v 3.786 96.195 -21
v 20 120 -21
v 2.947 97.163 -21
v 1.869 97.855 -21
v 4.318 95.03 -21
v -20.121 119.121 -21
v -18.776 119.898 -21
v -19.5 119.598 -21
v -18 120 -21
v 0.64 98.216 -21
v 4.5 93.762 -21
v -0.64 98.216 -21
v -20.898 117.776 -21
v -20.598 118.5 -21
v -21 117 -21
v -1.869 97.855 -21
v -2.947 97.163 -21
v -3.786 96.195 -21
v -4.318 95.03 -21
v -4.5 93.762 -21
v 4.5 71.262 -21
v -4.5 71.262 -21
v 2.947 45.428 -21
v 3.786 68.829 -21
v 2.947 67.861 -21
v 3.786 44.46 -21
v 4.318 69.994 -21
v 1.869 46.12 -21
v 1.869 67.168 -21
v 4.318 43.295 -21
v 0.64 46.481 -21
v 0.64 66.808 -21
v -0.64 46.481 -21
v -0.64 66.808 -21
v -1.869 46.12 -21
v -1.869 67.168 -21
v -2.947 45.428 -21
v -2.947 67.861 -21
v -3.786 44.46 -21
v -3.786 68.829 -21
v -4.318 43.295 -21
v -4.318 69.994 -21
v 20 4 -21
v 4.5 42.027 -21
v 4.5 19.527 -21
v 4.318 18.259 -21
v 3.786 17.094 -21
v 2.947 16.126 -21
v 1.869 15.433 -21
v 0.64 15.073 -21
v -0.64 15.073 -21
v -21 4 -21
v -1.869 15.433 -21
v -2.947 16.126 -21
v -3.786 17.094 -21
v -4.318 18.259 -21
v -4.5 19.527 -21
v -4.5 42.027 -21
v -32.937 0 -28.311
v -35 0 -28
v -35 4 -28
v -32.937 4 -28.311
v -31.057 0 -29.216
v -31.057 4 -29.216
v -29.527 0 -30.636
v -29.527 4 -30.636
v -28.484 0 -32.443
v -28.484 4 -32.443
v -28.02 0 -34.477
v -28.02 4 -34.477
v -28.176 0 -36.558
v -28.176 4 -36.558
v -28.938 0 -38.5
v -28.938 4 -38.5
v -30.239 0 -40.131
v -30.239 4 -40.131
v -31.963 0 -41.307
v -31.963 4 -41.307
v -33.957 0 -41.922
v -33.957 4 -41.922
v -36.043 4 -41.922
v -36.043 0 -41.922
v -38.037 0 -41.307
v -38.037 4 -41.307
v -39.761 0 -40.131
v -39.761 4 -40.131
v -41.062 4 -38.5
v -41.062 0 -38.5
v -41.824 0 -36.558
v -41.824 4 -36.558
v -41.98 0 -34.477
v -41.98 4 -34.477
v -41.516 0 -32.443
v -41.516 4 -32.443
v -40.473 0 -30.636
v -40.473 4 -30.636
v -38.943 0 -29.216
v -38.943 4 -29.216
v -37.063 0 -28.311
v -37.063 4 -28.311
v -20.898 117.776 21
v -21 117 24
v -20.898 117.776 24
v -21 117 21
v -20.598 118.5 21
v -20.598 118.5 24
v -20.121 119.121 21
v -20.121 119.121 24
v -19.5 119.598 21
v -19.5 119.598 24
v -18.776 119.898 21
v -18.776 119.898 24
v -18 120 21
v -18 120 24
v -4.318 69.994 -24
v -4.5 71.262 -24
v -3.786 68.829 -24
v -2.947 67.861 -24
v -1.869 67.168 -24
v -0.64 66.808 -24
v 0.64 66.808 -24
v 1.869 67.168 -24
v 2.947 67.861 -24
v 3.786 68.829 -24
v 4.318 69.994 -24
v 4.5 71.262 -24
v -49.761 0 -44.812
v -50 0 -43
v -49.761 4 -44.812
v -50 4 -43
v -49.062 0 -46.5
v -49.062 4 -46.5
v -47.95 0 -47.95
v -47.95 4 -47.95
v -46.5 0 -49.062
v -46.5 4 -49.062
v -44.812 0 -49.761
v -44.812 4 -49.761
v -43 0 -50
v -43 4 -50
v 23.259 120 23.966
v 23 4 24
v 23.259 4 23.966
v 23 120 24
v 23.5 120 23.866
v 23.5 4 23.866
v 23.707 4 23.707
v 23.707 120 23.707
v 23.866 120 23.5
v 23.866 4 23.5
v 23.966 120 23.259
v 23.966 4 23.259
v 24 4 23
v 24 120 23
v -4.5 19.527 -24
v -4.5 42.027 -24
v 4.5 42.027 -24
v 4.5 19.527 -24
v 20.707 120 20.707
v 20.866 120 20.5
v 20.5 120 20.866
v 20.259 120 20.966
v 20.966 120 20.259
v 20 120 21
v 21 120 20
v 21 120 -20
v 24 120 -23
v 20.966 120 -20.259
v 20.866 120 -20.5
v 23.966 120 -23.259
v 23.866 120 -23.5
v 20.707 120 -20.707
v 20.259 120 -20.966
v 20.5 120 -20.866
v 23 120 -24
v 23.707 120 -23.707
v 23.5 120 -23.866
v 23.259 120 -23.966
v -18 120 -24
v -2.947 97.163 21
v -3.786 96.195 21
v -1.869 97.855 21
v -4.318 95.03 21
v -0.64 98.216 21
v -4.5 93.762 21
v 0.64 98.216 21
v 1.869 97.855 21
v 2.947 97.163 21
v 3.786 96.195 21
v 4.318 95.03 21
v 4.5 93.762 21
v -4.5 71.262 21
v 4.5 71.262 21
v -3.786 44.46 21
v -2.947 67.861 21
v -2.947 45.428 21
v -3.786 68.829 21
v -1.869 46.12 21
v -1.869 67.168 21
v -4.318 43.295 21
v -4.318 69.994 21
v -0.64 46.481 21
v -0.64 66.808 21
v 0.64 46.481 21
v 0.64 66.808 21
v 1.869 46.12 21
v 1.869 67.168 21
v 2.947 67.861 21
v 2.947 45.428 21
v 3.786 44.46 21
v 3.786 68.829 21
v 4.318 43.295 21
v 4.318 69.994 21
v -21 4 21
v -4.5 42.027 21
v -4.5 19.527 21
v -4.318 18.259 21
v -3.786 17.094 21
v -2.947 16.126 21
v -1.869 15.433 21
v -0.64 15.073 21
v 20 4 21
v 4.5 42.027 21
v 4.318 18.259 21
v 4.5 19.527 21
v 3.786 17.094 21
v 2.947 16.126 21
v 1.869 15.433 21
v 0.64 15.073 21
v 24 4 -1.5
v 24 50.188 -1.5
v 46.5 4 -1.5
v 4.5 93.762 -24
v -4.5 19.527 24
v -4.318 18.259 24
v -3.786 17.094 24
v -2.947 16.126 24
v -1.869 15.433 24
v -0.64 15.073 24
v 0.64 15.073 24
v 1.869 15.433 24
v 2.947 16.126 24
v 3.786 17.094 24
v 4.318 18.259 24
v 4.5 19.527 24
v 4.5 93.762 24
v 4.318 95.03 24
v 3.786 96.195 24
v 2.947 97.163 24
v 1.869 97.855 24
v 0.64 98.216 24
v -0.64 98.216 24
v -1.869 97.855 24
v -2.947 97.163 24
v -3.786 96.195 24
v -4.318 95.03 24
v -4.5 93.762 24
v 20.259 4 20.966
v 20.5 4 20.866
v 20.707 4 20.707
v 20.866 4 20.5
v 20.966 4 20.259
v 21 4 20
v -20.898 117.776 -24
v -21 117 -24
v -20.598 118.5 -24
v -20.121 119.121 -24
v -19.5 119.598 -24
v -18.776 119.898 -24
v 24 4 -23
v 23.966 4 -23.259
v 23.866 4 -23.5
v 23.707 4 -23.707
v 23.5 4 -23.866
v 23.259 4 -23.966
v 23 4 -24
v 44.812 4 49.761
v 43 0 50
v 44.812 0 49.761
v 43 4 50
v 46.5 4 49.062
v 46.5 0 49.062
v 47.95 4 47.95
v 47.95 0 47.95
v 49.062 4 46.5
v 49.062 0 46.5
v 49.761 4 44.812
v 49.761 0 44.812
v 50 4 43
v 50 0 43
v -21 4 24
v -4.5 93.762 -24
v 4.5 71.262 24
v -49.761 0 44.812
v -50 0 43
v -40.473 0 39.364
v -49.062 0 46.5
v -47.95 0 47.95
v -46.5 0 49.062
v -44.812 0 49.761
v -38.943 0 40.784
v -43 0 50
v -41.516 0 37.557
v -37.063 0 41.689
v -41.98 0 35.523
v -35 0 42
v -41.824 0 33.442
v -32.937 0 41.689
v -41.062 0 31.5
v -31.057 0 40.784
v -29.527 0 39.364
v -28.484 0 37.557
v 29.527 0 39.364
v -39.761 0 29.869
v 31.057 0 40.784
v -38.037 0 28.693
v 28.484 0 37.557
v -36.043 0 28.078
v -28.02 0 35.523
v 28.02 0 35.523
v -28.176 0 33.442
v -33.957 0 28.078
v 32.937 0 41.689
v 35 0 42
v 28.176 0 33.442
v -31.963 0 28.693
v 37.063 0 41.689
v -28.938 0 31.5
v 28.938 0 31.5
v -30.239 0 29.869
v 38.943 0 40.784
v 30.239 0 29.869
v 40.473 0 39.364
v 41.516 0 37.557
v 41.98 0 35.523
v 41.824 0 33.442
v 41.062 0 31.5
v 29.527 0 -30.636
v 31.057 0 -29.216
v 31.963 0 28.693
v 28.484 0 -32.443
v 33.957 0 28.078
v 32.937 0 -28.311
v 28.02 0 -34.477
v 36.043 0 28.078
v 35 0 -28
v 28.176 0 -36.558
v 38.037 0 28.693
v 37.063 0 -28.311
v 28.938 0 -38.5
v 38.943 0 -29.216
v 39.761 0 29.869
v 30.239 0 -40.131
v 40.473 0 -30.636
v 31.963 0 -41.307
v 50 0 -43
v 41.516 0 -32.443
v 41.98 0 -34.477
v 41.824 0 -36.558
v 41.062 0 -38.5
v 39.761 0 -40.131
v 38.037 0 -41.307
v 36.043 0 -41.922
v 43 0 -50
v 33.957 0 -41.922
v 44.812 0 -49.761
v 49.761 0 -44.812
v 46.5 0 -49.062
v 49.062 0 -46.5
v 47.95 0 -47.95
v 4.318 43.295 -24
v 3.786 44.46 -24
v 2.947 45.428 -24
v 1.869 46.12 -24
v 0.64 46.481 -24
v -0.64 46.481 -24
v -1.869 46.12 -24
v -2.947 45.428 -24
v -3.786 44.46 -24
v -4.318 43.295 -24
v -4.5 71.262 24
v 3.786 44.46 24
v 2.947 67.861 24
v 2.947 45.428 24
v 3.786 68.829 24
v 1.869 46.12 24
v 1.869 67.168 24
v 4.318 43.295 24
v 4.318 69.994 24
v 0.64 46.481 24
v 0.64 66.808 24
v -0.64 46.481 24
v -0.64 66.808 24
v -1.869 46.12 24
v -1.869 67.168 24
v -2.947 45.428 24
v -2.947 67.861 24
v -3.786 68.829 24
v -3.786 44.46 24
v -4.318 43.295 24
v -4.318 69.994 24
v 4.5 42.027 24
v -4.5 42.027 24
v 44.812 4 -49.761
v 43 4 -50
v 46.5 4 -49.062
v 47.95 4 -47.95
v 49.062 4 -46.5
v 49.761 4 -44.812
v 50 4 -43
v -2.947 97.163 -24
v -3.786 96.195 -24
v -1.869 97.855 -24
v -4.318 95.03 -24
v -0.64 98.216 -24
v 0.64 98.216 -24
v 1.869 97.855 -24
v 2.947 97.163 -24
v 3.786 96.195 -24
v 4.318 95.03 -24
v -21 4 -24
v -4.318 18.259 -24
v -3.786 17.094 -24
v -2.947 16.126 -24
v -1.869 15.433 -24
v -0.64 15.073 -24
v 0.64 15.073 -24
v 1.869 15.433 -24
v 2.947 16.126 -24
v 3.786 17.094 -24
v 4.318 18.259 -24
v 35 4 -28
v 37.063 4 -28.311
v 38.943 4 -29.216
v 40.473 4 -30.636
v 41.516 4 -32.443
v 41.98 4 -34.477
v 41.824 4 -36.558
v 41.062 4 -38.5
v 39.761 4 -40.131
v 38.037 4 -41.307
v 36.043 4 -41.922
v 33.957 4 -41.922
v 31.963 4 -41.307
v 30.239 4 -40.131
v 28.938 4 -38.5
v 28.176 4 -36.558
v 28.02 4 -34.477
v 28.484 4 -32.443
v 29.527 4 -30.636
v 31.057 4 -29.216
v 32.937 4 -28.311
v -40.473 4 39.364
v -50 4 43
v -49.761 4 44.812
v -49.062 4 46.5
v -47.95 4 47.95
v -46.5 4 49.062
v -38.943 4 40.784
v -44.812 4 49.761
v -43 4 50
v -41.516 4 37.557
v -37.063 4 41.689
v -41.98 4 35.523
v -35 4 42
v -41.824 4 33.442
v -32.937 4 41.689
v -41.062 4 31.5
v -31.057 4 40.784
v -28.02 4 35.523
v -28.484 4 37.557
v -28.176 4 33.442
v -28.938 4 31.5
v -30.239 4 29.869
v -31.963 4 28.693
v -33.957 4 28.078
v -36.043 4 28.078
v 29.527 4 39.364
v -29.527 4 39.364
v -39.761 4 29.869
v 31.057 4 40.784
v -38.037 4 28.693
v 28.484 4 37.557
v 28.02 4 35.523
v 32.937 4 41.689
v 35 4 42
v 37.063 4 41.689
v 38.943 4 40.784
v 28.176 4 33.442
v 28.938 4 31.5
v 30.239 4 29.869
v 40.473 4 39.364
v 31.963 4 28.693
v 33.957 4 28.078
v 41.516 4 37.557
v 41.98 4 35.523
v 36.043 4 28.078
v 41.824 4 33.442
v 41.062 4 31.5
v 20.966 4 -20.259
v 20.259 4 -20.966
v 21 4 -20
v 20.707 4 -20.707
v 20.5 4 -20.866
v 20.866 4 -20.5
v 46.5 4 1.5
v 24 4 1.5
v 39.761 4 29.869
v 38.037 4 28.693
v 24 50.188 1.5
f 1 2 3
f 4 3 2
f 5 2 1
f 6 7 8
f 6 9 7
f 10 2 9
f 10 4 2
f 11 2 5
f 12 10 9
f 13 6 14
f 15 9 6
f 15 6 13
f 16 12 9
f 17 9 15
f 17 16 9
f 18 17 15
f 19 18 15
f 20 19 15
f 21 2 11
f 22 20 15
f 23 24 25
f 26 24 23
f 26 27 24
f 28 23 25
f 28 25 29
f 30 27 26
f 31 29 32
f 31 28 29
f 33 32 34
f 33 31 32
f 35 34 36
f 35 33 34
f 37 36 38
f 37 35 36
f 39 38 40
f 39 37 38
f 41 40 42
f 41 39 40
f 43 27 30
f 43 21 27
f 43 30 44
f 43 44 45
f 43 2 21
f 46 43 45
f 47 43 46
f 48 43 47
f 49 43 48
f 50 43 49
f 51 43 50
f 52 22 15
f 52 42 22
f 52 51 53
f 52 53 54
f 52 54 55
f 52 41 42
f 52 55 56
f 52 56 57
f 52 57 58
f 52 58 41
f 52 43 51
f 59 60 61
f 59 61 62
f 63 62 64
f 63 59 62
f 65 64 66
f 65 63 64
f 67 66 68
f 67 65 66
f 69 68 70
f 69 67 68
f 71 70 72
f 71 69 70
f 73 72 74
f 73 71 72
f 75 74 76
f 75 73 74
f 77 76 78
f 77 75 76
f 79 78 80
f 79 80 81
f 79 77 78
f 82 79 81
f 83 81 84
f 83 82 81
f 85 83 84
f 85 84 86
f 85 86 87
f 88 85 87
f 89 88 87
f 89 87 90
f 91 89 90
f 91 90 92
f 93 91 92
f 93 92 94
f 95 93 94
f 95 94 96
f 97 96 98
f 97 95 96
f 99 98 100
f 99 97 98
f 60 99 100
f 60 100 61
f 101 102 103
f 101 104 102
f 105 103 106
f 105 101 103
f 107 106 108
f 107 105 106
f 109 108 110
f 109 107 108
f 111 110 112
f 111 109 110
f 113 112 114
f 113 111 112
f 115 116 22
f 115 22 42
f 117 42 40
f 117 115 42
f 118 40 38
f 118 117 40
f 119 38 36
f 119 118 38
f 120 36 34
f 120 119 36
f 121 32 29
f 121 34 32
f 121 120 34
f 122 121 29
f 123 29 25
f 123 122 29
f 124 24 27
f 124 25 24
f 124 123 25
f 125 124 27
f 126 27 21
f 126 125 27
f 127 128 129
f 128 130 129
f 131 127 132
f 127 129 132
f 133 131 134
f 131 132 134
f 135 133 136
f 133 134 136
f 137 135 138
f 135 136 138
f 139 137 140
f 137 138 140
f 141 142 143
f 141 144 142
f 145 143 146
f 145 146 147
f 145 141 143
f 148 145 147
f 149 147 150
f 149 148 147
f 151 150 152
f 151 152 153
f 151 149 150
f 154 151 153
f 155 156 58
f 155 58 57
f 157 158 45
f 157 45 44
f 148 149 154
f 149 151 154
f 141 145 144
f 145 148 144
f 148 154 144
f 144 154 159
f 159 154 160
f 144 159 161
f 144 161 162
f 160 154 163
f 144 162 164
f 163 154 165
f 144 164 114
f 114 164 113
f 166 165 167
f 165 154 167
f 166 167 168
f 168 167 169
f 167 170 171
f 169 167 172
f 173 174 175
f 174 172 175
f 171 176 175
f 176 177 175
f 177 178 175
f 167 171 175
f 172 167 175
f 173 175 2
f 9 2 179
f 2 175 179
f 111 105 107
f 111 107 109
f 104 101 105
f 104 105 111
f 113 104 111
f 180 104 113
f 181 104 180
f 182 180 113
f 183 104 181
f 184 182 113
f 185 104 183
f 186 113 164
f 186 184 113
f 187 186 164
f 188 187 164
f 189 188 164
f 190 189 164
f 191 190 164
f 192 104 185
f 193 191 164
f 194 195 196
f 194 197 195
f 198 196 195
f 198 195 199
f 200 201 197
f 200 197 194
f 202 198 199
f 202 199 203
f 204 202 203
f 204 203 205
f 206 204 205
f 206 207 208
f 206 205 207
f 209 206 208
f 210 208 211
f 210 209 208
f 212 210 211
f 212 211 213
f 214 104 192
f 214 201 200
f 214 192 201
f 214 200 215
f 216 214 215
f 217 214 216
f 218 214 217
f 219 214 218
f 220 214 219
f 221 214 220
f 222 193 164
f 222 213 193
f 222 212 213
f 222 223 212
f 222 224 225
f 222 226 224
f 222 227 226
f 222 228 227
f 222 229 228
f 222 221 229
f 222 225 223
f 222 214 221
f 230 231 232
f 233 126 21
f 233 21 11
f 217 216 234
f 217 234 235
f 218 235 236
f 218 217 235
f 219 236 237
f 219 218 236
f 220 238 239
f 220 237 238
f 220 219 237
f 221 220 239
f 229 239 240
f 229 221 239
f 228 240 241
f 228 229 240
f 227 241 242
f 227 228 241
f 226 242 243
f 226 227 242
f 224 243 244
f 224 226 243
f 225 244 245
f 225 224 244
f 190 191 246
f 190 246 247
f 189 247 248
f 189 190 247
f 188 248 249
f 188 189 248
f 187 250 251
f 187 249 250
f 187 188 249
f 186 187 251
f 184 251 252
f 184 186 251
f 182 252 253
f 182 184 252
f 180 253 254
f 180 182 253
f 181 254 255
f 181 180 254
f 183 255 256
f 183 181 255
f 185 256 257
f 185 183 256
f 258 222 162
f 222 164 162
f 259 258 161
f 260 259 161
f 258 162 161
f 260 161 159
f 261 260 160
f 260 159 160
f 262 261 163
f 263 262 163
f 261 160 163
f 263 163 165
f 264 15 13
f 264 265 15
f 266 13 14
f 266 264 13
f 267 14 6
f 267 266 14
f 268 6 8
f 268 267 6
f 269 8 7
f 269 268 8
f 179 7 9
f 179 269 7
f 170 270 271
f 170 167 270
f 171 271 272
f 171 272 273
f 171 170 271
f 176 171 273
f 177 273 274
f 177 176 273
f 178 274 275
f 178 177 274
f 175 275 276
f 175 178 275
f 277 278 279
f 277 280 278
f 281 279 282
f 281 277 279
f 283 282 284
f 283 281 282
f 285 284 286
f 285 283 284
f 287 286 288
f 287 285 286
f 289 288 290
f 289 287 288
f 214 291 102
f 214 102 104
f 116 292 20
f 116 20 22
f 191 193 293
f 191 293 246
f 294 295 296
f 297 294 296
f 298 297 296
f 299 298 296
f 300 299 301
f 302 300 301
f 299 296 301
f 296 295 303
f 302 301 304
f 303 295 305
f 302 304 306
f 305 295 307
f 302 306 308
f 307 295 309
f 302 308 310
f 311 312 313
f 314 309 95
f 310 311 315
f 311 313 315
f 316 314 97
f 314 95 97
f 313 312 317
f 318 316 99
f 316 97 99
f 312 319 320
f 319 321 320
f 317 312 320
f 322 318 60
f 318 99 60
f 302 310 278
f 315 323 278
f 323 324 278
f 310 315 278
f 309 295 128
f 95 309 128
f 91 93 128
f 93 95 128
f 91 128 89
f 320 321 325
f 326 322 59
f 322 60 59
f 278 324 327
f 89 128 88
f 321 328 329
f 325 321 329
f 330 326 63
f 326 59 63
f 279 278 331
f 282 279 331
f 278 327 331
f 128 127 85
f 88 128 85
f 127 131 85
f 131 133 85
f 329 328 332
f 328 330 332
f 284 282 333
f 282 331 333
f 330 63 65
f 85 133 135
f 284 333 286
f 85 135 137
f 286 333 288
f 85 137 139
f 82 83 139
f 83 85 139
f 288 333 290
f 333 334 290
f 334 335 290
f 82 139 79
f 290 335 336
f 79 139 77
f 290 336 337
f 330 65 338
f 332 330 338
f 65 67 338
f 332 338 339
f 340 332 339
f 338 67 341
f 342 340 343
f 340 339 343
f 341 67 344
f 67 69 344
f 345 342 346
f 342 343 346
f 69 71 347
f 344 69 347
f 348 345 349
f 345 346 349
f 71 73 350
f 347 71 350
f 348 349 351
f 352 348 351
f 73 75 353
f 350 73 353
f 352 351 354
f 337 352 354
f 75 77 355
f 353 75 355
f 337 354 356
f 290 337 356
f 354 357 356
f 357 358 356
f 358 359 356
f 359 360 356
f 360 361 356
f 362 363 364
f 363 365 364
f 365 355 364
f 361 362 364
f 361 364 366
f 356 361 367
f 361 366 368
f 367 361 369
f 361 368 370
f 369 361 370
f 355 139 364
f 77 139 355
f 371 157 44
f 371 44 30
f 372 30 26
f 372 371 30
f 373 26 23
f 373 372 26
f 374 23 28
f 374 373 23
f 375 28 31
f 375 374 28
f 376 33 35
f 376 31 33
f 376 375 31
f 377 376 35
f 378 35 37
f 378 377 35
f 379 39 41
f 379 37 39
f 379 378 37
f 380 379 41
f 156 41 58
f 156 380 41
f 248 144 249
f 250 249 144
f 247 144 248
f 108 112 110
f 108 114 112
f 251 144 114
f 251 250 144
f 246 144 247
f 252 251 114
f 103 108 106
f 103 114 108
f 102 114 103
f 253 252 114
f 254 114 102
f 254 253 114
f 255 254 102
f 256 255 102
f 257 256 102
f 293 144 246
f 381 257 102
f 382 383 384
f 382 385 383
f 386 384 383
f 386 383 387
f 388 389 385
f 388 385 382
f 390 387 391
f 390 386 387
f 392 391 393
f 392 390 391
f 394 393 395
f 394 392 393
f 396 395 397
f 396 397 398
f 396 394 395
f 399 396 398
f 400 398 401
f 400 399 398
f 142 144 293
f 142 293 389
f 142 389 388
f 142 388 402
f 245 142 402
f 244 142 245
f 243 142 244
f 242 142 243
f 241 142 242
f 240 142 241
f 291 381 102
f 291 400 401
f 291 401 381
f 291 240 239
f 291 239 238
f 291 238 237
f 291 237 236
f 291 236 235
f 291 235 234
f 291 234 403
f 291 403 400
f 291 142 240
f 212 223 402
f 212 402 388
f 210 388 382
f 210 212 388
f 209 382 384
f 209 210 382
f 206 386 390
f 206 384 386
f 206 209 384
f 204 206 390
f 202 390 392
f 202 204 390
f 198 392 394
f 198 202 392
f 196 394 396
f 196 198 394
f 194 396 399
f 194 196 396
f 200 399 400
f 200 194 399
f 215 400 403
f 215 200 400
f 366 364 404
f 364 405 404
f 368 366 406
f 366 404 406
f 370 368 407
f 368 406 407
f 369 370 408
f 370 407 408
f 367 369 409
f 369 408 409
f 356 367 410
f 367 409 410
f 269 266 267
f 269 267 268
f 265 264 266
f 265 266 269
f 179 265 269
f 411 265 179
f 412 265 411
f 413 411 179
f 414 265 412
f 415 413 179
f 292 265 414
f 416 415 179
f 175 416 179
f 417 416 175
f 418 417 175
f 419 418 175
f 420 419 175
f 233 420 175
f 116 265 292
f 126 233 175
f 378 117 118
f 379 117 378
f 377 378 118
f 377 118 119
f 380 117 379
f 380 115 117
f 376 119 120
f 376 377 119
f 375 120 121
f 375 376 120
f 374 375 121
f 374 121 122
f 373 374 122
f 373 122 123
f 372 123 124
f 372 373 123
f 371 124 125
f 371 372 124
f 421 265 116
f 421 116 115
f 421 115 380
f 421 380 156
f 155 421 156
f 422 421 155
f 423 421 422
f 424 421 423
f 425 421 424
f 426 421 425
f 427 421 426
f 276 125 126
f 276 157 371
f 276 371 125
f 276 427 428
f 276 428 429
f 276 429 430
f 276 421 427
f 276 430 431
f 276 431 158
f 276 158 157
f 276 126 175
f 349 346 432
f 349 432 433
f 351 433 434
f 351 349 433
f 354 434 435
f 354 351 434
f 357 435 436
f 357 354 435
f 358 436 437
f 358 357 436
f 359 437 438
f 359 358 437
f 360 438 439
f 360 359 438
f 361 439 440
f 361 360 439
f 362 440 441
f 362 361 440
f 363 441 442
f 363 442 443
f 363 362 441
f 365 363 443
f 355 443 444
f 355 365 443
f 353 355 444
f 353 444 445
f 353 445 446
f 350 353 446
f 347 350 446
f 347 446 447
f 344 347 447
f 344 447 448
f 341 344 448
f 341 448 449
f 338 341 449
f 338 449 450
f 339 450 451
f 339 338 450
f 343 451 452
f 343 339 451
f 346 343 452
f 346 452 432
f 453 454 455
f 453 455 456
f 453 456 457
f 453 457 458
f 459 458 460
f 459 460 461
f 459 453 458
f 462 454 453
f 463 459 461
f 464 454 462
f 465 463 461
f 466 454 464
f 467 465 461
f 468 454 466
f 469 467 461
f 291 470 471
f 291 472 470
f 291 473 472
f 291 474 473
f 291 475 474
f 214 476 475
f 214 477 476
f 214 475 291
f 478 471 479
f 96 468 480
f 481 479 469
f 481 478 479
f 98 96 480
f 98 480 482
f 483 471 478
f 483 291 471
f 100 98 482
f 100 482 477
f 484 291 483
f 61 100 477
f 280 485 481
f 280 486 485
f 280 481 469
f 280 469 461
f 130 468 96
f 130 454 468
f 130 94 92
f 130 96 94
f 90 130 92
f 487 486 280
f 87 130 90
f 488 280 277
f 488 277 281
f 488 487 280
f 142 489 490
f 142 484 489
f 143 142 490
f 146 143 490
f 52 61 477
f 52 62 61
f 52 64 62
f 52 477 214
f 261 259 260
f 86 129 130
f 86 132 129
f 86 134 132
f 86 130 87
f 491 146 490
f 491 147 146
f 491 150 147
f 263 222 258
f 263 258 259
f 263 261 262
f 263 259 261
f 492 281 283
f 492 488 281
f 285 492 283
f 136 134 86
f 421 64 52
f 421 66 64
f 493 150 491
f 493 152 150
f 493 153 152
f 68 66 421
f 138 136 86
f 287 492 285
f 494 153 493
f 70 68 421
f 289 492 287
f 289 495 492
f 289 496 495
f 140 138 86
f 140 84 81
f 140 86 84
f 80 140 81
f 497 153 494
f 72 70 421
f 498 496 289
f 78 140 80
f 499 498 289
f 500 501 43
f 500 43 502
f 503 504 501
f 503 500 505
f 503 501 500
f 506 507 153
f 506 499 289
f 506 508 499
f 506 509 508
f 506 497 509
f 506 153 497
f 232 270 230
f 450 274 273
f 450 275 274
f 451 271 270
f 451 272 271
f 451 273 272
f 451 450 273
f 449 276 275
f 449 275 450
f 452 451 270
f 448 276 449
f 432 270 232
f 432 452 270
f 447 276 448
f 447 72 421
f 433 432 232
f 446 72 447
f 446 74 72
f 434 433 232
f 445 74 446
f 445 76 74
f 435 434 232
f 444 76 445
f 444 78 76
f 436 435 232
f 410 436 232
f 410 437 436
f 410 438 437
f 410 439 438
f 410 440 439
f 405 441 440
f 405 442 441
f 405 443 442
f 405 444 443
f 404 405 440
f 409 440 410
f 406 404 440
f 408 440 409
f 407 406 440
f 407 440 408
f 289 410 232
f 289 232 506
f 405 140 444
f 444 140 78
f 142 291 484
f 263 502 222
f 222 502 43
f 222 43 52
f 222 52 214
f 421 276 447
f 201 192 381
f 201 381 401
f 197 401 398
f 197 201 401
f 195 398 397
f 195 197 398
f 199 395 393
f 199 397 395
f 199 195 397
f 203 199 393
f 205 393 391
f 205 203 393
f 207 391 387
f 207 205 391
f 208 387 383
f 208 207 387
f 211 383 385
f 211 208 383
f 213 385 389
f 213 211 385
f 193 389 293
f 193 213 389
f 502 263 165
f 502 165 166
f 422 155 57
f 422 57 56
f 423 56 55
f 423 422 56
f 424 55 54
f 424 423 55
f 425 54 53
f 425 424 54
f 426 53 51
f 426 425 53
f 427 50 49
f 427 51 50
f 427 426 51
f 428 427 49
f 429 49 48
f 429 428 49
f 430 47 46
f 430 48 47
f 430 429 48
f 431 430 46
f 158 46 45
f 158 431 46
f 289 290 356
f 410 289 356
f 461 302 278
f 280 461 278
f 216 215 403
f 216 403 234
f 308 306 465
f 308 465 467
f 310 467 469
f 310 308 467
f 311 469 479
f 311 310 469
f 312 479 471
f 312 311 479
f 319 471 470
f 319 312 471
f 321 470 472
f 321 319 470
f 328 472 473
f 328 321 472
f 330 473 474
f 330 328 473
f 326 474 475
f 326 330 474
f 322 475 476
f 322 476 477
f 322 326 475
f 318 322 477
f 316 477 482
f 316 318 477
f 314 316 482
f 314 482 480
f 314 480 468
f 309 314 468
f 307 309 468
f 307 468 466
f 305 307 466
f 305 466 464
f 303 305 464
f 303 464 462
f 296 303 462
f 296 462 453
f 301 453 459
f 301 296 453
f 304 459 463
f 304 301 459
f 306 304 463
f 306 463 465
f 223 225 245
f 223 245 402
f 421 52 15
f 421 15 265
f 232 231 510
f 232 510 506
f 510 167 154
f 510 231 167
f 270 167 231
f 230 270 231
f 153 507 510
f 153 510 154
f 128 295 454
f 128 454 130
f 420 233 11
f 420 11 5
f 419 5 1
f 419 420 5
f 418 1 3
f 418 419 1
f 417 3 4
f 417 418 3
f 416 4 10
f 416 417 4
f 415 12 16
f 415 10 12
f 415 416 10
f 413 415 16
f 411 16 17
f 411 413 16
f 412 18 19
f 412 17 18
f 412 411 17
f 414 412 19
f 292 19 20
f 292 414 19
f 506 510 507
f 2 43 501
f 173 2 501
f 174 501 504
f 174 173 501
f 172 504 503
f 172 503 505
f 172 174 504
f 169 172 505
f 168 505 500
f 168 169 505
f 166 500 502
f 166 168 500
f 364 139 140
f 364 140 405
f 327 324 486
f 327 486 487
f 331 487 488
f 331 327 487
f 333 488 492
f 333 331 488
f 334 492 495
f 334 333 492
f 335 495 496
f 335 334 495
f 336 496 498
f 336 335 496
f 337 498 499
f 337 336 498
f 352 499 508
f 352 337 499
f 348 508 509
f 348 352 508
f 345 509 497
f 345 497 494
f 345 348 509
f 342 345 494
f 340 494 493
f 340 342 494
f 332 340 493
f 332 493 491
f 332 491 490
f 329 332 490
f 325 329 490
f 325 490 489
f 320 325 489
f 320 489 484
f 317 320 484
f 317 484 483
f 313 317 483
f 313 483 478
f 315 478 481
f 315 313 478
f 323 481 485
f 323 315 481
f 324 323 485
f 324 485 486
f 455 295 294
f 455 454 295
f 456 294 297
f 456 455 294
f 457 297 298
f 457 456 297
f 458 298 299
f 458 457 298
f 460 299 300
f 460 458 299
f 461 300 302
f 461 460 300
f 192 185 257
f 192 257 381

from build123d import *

# Parameters (mm, degrees)
SKETCH_1_W          = 99.999995276
SKETCH_1_H          = 99.999995276
SKETCH_1_R          = 7
EXTRUDE_2_DEPTH     = 4
FILLET_2_R          = 7
EXTRUDE_3_DEPTH     = 116
FILLET_3_R          = 3
FILLET_4_R          = 1
CUT_EXTRUDE_1_DEPTH = 116
RIB_1_REACH         = 141.284
SKETCH_6_WALL_W     = 331.945026876
SKETCH_6_WALL_H     = 3


with BuildPart() as part:
    # 草图1 → 凸台-拉伸2 (new body)
    with BuildSketch(Plane(origin=(0, 0, 0), x_dir=(1, 0, 0), z_dir=(0, 1, 0))):
        Rectangle(SKETCH_1_W, SKETCH_1_H)
        with Locations(Location((-35, 35, 0), (0, 0, 270))):
            Circle(SKETCH_1_R, mode=Mode.SUBTRACT)
        with Locations(Location((35, 35, 0), (0, 0, 270))):
            Circle(SKETCH_1_R, mode=Mode.SUBTRACT)
        with Locations(Location((35, -35, 0), (0, 0, 270))):
            Circle(SKETCH_1_R, mode=Mode.SUBTRACT)
        with Locations(Location((-35, -35, 0), (0, 0, 270))):
            Circle(SKETCH_1_R, mode=Mode.SUBTRACT)
    extrude(amount=EXTRUDE_2_DEPTH)

    # 圆角2
    fillet_2_edges = [part.edges().sort_by_distance(p)[0] for p in [
        (-49.999997638, 2, -49.999997638),
        (49.999997638, 2, -49.999997638),
        (49.999997638, 2, 49.999997638),
        (-49.999997638, 2, 49.999997638),
    ]]
    fillet(fillet_2_edges, radius=FILLET_2_R)

    # 草图3 → 凸台-拉伸3 (add)
    with BuildSketch(Plane(origin=(0, 4, 0), x_dir=(1, 0, 0), z_dir=(0, 1, 0))):
        Polygon((-21, -24), (-21, -21), (21, -21), (21, 21), (-21, 21), (-21, 24), (24, 24), (24, -24), align=None)
    extrude(amount=EXTRUDE_3_DEPTH)

    # 圆角3
    fillet_3_edges = [part.edges().sort_by_distance(p)[0] for p in [
        (-21, 120, 22.5),
        (-21, 120, -22.5),
    ]]
    fillet(fillet_3_edges, radius=FILLET_3_R)

    # 圆角4
    fillet_4_edges = [part.edges().sort_by_distance(p)[0] for p in [
        (24, 62, 24),
        (24, 62, -24),
        (21, 62, -21),
        (21, 62, 21),
    ]]
    fillet(fillet_4_edges, radius=FILLET_4_R)

    # 草图4 → 切除-拉伸1 (cut)
    with BuildSketch(Plane(origin=(0, 0, -24), x_dir=(-1, 0, 0), z_dir=(0, 0, -1))):
        with BuildLine():
            Line((4.5, 93.761812865), (4.5, 71.261812865))
            ThreePointArc((4.5, 71.261812865), (0, 66.761812865), (-4.5, 71.261812865))
            Line((-4.5, 71.261812865), (-4.5, 93.761812865))
            ThreePointArc((-4.5, 93.761812865), (0, 98.261812865), (4.5, 93.761812865))
        make_face()
        with BuildLine():
            Line((4.5, 42.026719912), (4.5, 19.526719912))
            ThreePointArc((4.5, 19.526719912), (0, 15.026719912), (-4.5, 19.526719912))
            Line((-4.5, 19.526719912), (-4.5, 42.026719912))
            ThreePointArc((-4.5, 42.026719912), (0, 46.526719912), (4.5, 42.026719912))
        make_face()
    extrude(amount=-CUT_EXTRUDE_1_DEPTH, mode=Mode.SUBTRACT)

    # 草图6 wall → 筋1 (add, up to next)
    with BuildSketch(Plane(origin=(35.249998819, 27.094227832, 0), x_dir=(0.437936853183, -0.89900573559, 0), z_dir=(0.89900573559, 0.437936853183, 0)), mode=Mode.PRIVATE) as rib_1_sk1:
        Rectangle(SKETCH_6_WALL_W, SKETCH_6_WALL_H)
    rib_1_tool1 = extrude(rib_1_sk1.sketch, amount=-RIB_1_REACH, mode=Mode.PRIVATE) - part.part
    add(rib_1_tool1.solids().sort_by_distance((35.249998819, 27.094227832, 0))[0])


solid = part.part
